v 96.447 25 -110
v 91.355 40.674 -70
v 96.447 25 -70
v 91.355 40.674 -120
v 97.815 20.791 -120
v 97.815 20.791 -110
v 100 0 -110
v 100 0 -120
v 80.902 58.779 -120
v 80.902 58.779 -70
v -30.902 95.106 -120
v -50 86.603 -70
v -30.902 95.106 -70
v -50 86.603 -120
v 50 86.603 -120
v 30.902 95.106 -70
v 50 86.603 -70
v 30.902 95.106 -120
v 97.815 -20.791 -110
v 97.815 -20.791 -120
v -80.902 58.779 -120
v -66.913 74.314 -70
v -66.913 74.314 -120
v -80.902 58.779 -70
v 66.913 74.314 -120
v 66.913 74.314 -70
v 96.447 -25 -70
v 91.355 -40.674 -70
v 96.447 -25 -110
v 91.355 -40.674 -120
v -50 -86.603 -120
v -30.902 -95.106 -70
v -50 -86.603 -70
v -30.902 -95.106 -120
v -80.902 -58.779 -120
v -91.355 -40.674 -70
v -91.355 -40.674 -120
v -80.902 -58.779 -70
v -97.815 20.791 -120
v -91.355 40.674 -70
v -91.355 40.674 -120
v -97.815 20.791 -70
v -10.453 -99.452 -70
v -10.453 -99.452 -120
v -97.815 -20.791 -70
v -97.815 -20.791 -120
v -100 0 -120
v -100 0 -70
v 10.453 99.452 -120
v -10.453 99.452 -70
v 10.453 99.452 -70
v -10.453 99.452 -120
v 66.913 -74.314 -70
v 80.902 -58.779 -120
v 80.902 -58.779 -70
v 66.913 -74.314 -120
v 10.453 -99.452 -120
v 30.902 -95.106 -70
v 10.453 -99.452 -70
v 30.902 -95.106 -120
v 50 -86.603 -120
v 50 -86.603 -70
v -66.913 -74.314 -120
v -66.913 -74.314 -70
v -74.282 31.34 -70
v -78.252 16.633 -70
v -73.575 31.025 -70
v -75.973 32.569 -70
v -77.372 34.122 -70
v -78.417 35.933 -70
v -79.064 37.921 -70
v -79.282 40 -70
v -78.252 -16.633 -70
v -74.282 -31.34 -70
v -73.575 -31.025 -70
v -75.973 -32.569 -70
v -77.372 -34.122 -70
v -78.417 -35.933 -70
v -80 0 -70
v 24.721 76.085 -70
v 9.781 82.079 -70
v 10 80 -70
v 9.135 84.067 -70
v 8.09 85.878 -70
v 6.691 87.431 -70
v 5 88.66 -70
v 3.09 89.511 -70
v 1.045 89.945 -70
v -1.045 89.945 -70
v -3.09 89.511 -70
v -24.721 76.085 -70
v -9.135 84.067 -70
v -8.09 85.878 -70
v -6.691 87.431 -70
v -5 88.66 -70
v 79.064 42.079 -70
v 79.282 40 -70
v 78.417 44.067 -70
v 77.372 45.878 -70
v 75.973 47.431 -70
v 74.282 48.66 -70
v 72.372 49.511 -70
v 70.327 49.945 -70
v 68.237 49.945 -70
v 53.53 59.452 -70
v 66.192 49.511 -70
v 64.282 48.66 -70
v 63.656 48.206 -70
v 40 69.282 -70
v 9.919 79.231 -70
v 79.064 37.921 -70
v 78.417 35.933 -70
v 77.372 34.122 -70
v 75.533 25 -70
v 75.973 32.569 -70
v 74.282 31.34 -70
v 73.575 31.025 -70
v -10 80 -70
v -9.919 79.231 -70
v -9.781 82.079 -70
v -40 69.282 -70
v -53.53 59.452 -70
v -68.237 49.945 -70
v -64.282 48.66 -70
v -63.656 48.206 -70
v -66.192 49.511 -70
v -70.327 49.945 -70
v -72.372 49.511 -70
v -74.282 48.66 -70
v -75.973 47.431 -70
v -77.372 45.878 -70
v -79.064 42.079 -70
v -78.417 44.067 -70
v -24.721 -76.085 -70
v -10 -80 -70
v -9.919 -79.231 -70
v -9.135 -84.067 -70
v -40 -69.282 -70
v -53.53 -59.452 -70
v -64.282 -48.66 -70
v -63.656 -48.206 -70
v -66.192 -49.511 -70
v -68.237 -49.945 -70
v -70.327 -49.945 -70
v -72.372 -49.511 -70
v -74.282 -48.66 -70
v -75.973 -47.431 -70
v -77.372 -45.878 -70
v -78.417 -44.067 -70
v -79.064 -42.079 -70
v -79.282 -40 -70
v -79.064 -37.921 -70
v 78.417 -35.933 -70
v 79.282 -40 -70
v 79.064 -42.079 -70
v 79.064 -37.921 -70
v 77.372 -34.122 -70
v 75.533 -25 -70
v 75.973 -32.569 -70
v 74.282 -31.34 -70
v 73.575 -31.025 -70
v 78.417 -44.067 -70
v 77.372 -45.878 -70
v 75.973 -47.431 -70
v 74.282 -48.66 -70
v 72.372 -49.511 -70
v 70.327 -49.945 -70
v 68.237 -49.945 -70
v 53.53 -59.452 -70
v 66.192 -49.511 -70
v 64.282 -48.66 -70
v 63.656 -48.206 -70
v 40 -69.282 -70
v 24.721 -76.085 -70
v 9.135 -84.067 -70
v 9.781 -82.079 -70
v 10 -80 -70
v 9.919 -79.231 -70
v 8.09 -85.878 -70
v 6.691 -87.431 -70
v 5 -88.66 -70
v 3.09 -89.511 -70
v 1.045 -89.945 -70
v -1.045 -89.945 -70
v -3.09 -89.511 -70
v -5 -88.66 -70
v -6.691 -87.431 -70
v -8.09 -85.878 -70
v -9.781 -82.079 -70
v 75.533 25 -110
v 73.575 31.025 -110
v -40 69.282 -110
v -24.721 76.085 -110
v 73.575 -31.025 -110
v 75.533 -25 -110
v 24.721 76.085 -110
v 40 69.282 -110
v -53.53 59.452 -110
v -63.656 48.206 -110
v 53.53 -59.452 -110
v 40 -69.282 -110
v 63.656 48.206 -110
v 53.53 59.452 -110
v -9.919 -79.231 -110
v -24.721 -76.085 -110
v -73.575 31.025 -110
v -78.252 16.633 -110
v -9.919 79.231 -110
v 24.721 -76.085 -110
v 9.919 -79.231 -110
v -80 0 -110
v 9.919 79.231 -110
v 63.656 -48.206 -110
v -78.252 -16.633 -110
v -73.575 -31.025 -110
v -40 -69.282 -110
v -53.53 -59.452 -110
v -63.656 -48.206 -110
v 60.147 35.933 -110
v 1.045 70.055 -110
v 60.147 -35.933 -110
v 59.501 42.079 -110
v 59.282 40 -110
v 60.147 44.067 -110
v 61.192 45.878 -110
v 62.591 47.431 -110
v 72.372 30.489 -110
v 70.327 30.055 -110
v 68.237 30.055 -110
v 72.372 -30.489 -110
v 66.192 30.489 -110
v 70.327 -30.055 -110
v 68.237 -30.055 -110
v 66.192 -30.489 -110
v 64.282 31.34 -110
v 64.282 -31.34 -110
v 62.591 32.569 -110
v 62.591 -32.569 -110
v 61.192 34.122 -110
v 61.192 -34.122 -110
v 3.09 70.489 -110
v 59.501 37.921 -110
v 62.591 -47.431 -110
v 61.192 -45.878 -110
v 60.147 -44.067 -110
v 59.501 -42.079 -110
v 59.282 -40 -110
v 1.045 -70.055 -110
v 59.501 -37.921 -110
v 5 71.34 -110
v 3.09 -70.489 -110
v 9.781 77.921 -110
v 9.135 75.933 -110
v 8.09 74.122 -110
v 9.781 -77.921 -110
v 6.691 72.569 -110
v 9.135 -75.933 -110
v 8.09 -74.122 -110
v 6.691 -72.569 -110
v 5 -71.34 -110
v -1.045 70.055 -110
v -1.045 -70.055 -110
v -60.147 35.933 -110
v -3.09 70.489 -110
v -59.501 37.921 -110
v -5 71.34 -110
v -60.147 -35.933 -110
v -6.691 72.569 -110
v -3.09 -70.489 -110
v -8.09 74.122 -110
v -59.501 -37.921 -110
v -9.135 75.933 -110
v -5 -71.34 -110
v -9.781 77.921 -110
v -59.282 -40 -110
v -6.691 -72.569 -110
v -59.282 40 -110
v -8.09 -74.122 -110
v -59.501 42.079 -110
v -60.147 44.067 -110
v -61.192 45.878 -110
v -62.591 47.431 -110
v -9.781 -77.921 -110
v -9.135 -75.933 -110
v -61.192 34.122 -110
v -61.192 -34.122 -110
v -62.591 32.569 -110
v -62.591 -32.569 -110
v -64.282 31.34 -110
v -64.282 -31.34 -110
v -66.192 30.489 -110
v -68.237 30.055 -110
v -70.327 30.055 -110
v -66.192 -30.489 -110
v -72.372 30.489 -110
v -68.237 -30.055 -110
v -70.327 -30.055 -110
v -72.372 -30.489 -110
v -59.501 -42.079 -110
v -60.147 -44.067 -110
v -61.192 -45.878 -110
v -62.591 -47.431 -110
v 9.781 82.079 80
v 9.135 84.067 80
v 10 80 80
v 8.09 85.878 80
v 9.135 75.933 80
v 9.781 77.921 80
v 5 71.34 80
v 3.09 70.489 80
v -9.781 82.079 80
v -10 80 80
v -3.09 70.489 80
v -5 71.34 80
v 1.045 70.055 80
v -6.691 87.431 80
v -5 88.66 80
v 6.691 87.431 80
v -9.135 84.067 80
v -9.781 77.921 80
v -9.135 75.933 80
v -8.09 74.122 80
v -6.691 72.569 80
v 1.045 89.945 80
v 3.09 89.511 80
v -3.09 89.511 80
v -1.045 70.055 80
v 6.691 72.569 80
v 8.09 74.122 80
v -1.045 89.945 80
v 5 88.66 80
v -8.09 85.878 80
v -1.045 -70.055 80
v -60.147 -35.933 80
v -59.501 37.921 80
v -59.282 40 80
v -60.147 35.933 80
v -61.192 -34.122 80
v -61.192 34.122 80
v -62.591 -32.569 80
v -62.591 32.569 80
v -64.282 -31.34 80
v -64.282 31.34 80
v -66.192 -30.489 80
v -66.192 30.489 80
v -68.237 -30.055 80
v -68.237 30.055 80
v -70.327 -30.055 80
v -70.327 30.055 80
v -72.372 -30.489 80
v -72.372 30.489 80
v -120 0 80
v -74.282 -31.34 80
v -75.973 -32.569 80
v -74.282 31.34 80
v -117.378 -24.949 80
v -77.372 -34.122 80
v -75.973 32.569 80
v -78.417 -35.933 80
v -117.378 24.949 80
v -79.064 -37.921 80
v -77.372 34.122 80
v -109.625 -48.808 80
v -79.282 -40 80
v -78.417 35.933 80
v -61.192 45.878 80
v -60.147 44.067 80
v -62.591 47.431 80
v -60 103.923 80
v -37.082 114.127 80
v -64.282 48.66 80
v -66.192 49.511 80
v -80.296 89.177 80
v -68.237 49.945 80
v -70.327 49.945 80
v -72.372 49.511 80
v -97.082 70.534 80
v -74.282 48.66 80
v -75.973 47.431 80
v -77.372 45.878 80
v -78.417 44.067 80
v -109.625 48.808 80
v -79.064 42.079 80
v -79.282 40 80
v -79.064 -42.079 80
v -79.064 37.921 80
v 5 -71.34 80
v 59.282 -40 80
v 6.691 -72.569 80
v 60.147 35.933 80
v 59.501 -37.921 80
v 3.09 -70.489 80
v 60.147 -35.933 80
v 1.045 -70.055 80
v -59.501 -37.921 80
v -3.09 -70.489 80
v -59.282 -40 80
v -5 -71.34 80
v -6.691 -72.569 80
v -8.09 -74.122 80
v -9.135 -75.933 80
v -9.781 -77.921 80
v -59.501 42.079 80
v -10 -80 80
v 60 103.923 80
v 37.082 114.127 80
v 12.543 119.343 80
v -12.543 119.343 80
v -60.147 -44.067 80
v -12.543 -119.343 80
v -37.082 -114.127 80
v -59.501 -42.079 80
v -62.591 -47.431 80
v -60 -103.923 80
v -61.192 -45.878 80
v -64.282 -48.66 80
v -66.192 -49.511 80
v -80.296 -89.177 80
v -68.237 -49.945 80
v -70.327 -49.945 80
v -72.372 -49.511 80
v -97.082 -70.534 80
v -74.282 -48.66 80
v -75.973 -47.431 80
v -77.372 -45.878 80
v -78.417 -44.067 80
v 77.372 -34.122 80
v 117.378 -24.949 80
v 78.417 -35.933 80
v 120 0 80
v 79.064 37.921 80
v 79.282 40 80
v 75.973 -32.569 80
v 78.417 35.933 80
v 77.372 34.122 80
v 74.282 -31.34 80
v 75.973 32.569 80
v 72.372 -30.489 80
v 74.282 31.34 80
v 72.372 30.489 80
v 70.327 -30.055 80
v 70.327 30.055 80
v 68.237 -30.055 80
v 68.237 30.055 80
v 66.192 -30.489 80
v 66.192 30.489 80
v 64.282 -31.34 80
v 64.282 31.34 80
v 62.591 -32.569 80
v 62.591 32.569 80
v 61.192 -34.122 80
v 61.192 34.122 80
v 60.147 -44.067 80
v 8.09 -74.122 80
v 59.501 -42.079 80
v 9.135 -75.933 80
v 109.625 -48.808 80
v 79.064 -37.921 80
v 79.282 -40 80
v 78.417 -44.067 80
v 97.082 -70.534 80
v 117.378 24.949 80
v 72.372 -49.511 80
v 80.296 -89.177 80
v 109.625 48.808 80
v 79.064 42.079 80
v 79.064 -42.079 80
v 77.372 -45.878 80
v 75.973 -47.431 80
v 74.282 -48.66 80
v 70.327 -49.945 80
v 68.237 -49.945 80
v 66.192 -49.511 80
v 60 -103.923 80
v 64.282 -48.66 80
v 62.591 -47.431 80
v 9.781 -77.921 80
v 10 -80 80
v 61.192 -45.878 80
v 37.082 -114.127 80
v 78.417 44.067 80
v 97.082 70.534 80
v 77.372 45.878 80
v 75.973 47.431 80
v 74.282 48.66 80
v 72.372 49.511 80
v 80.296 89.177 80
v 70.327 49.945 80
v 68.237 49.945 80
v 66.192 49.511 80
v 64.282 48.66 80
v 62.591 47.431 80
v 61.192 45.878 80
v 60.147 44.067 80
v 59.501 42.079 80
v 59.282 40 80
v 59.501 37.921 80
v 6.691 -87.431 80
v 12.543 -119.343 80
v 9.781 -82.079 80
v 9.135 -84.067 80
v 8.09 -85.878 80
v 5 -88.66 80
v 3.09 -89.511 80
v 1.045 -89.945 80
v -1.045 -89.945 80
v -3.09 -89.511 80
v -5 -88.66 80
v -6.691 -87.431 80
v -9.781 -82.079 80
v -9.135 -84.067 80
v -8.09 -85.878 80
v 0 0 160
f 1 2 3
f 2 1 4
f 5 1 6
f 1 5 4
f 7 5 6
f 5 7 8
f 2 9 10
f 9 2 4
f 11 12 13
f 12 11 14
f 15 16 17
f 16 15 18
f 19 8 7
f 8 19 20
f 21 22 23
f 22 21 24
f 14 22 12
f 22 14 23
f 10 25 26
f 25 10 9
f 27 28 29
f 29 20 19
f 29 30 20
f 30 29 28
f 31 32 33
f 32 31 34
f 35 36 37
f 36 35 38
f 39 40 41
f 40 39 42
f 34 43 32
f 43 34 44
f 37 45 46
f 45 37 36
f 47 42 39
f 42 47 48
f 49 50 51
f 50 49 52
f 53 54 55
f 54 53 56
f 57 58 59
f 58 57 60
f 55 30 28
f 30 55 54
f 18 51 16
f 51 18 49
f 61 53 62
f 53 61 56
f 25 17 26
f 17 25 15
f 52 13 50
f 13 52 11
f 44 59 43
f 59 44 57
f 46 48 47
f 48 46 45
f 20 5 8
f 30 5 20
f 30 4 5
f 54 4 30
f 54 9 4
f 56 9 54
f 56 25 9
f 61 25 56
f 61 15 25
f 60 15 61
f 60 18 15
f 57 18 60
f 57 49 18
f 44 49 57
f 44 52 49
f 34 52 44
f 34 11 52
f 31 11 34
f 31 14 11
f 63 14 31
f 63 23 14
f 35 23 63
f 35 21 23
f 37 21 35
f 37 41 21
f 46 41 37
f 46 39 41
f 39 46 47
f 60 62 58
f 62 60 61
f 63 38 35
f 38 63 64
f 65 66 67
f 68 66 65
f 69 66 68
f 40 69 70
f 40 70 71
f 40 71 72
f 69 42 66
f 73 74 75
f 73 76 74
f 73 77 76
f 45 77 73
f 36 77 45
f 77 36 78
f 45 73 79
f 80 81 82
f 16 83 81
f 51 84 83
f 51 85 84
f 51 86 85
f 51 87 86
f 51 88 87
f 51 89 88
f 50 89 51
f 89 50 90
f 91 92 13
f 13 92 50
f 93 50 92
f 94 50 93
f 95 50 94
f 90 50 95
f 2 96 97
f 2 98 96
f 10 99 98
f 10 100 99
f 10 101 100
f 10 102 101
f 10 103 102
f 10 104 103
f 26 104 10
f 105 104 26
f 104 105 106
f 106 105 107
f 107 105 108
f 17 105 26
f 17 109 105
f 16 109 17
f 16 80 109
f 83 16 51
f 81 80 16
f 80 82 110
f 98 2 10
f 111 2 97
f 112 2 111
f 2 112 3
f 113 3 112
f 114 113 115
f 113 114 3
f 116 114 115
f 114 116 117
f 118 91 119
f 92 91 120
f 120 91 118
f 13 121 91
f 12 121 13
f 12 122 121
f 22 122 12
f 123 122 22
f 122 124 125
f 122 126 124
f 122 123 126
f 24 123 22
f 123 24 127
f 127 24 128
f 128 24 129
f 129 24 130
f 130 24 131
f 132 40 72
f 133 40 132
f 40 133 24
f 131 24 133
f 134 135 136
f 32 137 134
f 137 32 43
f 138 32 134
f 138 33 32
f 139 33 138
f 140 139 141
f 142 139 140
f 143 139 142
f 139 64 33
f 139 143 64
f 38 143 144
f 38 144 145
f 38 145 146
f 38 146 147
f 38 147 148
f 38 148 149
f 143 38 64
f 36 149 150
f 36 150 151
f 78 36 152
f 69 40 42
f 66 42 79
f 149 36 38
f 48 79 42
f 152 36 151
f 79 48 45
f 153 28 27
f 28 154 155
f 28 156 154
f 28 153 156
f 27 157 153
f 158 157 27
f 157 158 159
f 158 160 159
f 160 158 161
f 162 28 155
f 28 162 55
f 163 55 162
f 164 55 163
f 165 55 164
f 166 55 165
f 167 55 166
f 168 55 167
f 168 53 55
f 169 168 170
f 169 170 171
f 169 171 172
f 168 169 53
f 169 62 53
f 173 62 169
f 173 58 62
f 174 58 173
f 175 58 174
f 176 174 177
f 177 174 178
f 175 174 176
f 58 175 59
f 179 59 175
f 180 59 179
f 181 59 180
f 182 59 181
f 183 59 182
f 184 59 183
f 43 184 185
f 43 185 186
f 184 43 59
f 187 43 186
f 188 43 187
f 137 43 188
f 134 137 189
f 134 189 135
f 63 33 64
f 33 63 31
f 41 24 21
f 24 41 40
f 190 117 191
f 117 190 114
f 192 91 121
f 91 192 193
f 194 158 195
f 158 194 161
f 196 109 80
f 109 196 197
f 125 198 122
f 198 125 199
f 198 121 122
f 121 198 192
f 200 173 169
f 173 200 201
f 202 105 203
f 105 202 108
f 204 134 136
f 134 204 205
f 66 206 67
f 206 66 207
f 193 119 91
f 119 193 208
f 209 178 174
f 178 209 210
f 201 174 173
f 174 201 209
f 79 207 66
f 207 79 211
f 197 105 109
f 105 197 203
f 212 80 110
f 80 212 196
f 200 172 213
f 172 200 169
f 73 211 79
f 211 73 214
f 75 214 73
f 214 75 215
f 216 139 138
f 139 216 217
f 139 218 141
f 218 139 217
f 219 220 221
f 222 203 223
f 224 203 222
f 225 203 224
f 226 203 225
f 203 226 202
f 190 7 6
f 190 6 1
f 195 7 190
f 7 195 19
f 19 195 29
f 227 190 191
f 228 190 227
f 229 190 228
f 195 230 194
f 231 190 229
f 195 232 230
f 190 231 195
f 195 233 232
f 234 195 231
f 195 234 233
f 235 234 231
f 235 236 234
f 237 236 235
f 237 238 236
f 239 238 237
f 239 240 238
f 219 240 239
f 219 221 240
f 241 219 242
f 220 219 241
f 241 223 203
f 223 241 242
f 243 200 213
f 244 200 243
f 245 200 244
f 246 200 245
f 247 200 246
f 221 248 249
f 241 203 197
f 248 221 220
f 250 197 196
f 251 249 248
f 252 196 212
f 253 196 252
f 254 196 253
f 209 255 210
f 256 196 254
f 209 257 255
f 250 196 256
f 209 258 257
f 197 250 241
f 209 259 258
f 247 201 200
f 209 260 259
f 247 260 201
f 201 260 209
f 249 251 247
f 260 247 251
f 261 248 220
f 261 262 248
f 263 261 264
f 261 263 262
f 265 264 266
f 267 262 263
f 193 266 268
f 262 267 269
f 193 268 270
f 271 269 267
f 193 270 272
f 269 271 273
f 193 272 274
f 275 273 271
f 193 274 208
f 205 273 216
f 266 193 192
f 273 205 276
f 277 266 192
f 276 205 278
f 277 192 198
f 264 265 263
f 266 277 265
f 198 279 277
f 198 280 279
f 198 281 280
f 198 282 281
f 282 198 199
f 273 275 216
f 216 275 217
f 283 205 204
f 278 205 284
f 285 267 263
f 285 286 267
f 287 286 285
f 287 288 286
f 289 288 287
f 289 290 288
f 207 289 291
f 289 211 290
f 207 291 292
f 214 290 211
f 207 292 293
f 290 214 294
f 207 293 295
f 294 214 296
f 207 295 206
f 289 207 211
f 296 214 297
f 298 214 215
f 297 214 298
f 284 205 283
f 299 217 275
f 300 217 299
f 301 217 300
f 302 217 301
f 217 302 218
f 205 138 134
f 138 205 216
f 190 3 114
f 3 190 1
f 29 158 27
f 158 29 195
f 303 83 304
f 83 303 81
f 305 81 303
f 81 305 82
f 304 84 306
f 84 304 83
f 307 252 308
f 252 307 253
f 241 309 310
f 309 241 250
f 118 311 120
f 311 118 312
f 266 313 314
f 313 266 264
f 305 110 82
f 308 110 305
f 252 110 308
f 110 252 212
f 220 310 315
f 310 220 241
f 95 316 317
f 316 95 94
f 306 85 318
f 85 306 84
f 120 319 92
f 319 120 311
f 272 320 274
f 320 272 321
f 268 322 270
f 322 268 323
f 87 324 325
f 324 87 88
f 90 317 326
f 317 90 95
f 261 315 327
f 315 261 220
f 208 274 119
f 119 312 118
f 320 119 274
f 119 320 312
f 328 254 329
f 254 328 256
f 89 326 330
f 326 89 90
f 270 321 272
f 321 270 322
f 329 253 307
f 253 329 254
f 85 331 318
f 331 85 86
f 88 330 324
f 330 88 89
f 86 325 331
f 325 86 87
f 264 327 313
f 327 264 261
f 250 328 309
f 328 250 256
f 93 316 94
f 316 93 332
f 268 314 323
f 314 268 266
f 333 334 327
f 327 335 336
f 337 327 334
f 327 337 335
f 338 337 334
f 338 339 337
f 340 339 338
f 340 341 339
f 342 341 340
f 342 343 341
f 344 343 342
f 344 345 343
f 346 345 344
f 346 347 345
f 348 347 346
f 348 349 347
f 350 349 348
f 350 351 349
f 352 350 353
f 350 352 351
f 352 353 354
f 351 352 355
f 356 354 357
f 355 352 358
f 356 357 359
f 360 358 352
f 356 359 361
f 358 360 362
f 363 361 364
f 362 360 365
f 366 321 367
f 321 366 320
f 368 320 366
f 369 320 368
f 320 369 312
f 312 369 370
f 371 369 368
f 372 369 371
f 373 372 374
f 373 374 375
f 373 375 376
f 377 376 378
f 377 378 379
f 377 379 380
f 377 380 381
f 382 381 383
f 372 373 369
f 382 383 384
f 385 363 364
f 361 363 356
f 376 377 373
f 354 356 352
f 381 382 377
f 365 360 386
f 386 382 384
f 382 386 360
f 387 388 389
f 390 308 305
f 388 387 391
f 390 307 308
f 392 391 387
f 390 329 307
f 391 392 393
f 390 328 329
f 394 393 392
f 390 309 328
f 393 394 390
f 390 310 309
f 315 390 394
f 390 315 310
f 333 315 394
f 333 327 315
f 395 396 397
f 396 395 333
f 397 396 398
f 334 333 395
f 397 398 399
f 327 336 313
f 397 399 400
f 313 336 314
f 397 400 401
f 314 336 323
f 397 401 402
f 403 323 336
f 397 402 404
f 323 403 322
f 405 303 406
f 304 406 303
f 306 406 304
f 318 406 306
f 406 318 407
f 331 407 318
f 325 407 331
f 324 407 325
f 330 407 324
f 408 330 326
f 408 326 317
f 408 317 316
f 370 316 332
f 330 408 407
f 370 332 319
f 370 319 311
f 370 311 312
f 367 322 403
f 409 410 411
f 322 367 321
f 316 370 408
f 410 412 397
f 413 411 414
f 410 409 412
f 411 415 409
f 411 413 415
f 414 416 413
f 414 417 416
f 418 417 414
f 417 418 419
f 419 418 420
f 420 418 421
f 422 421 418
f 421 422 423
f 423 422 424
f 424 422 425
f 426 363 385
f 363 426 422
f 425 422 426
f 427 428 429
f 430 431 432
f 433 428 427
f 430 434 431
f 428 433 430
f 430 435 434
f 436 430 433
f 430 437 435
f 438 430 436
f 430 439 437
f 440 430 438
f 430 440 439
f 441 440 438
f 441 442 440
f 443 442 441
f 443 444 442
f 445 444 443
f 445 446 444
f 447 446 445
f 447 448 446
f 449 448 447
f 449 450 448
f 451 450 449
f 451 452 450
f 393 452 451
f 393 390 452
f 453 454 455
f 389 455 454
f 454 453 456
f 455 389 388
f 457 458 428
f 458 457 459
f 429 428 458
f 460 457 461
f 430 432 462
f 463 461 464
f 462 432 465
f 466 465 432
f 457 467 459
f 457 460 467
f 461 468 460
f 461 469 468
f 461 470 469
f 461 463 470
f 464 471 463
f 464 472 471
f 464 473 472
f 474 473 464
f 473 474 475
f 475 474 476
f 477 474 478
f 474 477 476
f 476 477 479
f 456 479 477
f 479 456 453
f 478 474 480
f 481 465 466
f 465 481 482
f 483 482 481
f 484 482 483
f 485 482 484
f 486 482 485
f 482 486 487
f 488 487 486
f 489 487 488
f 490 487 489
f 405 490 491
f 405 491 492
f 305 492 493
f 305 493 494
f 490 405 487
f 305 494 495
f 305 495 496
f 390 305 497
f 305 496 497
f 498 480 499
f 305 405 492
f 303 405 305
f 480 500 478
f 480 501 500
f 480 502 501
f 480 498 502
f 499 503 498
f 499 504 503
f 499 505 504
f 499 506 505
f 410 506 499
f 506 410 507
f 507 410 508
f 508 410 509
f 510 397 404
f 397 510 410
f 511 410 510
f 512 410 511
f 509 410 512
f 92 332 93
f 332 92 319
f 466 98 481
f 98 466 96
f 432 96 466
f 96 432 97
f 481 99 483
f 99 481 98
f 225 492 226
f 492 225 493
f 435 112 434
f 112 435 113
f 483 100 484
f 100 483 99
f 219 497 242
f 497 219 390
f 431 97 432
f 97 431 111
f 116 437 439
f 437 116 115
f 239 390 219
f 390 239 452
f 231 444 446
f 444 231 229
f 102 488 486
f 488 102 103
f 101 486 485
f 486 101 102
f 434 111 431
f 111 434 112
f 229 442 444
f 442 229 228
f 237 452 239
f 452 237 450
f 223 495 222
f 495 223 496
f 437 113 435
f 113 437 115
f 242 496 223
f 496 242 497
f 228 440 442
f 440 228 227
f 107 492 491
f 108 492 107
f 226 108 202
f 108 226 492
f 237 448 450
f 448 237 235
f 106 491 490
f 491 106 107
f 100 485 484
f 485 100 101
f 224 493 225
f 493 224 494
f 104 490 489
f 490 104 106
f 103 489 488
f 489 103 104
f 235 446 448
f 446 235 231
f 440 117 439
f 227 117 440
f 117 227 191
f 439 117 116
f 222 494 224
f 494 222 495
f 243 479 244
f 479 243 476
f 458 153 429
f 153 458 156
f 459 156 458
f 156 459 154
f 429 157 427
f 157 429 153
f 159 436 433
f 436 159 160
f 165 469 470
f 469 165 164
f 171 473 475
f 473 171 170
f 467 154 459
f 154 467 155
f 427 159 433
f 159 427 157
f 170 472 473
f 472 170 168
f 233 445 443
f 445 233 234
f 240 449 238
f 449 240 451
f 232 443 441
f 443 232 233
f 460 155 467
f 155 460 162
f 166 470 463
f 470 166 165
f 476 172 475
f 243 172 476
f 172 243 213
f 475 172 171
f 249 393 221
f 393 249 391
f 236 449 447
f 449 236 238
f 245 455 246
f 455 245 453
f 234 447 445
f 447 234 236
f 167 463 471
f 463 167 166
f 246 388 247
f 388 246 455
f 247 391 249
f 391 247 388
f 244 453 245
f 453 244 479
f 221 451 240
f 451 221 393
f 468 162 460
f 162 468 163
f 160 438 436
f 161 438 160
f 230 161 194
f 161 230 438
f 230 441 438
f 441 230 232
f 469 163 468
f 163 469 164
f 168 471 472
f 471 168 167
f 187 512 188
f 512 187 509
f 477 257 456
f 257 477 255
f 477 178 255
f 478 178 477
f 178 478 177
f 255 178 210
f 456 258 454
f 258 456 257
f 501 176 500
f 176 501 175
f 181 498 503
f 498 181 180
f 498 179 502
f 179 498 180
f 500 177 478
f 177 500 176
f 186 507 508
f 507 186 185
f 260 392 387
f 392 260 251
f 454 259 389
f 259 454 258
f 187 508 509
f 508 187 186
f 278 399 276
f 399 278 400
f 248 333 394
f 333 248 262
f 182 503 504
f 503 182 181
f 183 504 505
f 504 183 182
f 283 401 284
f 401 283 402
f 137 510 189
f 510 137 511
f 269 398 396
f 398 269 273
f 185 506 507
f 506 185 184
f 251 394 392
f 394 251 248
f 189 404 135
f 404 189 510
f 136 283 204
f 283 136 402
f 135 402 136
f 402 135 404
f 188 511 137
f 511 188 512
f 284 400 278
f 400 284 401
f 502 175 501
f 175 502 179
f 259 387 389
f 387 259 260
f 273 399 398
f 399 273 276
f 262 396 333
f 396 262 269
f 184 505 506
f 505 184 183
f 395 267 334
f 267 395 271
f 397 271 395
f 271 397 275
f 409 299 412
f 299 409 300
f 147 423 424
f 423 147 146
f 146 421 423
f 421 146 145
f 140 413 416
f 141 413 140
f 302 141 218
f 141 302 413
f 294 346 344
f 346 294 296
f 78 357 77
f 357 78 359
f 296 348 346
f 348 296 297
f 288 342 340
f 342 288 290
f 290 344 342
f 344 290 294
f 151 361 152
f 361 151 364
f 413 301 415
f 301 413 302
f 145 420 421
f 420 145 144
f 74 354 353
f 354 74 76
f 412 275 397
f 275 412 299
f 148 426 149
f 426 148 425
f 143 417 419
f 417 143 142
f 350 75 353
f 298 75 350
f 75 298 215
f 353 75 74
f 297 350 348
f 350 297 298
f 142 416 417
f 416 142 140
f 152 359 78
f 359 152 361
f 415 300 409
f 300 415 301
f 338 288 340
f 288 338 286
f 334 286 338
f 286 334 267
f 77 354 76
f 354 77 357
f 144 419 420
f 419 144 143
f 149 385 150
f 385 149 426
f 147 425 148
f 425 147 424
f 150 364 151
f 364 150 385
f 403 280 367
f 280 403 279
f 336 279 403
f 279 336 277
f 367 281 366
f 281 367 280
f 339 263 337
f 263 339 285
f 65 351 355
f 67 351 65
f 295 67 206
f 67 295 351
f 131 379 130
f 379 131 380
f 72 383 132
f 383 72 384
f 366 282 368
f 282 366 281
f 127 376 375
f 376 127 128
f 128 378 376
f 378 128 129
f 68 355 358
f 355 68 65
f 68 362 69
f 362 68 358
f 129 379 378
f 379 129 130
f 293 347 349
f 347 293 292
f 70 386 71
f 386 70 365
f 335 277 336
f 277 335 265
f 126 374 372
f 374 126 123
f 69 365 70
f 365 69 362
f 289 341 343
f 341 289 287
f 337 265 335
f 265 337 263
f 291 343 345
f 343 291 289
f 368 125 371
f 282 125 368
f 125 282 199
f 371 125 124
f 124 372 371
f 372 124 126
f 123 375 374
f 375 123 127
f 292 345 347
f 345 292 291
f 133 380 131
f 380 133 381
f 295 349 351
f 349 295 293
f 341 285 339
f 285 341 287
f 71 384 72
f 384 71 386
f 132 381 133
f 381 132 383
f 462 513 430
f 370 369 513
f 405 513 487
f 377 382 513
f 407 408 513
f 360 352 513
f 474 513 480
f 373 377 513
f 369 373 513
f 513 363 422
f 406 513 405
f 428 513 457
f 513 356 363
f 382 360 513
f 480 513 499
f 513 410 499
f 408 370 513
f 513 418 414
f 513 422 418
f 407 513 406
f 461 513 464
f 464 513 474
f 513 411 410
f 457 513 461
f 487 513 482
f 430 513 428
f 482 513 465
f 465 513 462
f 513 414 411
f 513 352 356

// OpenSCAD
// Volume: 2233948.055771725, SurfaceArea: 265460.63775276527

module example005()
{
  translate([0, 0, -120]) {
    difference() {
      cylinder(h = 50, r = 100);
      translate([0, 0, 10]) cylinder(h = 50, r = 80);
      translate([100, 0, 35]) cube(50, center = true);
    }
    for (i = [0:5]) {
      echo(360*i/6, sin(360*i/6)*80, cos(360*i/6)*80);
      translate([sin(360*i/6)*80, cos(360*i/6)*80, 0 ])
        cylinder(h = 200, r=10);
    }
    translate([0, 0, 200])
      cylinder(h = 80, r1 = 120, r2 = 0);
  }
}

echo(version=version());

example005();

// Written by Clifford Wolf <clifford@clifford.at> and Marius
// Kintel <marius@kintel.net>
//
// To the extent possible under law, the author(s) have dedicated all
// copyright and related and neighboring rights to this software to the
// public domain worldwide. This software is distributed without any
// warranty.
//
// You should have received a copy of the CC0 Public Domain
// Dedication along with this software.
// If not, see <http://creativecommons.org/publicdomain/zero/1.0/>.
